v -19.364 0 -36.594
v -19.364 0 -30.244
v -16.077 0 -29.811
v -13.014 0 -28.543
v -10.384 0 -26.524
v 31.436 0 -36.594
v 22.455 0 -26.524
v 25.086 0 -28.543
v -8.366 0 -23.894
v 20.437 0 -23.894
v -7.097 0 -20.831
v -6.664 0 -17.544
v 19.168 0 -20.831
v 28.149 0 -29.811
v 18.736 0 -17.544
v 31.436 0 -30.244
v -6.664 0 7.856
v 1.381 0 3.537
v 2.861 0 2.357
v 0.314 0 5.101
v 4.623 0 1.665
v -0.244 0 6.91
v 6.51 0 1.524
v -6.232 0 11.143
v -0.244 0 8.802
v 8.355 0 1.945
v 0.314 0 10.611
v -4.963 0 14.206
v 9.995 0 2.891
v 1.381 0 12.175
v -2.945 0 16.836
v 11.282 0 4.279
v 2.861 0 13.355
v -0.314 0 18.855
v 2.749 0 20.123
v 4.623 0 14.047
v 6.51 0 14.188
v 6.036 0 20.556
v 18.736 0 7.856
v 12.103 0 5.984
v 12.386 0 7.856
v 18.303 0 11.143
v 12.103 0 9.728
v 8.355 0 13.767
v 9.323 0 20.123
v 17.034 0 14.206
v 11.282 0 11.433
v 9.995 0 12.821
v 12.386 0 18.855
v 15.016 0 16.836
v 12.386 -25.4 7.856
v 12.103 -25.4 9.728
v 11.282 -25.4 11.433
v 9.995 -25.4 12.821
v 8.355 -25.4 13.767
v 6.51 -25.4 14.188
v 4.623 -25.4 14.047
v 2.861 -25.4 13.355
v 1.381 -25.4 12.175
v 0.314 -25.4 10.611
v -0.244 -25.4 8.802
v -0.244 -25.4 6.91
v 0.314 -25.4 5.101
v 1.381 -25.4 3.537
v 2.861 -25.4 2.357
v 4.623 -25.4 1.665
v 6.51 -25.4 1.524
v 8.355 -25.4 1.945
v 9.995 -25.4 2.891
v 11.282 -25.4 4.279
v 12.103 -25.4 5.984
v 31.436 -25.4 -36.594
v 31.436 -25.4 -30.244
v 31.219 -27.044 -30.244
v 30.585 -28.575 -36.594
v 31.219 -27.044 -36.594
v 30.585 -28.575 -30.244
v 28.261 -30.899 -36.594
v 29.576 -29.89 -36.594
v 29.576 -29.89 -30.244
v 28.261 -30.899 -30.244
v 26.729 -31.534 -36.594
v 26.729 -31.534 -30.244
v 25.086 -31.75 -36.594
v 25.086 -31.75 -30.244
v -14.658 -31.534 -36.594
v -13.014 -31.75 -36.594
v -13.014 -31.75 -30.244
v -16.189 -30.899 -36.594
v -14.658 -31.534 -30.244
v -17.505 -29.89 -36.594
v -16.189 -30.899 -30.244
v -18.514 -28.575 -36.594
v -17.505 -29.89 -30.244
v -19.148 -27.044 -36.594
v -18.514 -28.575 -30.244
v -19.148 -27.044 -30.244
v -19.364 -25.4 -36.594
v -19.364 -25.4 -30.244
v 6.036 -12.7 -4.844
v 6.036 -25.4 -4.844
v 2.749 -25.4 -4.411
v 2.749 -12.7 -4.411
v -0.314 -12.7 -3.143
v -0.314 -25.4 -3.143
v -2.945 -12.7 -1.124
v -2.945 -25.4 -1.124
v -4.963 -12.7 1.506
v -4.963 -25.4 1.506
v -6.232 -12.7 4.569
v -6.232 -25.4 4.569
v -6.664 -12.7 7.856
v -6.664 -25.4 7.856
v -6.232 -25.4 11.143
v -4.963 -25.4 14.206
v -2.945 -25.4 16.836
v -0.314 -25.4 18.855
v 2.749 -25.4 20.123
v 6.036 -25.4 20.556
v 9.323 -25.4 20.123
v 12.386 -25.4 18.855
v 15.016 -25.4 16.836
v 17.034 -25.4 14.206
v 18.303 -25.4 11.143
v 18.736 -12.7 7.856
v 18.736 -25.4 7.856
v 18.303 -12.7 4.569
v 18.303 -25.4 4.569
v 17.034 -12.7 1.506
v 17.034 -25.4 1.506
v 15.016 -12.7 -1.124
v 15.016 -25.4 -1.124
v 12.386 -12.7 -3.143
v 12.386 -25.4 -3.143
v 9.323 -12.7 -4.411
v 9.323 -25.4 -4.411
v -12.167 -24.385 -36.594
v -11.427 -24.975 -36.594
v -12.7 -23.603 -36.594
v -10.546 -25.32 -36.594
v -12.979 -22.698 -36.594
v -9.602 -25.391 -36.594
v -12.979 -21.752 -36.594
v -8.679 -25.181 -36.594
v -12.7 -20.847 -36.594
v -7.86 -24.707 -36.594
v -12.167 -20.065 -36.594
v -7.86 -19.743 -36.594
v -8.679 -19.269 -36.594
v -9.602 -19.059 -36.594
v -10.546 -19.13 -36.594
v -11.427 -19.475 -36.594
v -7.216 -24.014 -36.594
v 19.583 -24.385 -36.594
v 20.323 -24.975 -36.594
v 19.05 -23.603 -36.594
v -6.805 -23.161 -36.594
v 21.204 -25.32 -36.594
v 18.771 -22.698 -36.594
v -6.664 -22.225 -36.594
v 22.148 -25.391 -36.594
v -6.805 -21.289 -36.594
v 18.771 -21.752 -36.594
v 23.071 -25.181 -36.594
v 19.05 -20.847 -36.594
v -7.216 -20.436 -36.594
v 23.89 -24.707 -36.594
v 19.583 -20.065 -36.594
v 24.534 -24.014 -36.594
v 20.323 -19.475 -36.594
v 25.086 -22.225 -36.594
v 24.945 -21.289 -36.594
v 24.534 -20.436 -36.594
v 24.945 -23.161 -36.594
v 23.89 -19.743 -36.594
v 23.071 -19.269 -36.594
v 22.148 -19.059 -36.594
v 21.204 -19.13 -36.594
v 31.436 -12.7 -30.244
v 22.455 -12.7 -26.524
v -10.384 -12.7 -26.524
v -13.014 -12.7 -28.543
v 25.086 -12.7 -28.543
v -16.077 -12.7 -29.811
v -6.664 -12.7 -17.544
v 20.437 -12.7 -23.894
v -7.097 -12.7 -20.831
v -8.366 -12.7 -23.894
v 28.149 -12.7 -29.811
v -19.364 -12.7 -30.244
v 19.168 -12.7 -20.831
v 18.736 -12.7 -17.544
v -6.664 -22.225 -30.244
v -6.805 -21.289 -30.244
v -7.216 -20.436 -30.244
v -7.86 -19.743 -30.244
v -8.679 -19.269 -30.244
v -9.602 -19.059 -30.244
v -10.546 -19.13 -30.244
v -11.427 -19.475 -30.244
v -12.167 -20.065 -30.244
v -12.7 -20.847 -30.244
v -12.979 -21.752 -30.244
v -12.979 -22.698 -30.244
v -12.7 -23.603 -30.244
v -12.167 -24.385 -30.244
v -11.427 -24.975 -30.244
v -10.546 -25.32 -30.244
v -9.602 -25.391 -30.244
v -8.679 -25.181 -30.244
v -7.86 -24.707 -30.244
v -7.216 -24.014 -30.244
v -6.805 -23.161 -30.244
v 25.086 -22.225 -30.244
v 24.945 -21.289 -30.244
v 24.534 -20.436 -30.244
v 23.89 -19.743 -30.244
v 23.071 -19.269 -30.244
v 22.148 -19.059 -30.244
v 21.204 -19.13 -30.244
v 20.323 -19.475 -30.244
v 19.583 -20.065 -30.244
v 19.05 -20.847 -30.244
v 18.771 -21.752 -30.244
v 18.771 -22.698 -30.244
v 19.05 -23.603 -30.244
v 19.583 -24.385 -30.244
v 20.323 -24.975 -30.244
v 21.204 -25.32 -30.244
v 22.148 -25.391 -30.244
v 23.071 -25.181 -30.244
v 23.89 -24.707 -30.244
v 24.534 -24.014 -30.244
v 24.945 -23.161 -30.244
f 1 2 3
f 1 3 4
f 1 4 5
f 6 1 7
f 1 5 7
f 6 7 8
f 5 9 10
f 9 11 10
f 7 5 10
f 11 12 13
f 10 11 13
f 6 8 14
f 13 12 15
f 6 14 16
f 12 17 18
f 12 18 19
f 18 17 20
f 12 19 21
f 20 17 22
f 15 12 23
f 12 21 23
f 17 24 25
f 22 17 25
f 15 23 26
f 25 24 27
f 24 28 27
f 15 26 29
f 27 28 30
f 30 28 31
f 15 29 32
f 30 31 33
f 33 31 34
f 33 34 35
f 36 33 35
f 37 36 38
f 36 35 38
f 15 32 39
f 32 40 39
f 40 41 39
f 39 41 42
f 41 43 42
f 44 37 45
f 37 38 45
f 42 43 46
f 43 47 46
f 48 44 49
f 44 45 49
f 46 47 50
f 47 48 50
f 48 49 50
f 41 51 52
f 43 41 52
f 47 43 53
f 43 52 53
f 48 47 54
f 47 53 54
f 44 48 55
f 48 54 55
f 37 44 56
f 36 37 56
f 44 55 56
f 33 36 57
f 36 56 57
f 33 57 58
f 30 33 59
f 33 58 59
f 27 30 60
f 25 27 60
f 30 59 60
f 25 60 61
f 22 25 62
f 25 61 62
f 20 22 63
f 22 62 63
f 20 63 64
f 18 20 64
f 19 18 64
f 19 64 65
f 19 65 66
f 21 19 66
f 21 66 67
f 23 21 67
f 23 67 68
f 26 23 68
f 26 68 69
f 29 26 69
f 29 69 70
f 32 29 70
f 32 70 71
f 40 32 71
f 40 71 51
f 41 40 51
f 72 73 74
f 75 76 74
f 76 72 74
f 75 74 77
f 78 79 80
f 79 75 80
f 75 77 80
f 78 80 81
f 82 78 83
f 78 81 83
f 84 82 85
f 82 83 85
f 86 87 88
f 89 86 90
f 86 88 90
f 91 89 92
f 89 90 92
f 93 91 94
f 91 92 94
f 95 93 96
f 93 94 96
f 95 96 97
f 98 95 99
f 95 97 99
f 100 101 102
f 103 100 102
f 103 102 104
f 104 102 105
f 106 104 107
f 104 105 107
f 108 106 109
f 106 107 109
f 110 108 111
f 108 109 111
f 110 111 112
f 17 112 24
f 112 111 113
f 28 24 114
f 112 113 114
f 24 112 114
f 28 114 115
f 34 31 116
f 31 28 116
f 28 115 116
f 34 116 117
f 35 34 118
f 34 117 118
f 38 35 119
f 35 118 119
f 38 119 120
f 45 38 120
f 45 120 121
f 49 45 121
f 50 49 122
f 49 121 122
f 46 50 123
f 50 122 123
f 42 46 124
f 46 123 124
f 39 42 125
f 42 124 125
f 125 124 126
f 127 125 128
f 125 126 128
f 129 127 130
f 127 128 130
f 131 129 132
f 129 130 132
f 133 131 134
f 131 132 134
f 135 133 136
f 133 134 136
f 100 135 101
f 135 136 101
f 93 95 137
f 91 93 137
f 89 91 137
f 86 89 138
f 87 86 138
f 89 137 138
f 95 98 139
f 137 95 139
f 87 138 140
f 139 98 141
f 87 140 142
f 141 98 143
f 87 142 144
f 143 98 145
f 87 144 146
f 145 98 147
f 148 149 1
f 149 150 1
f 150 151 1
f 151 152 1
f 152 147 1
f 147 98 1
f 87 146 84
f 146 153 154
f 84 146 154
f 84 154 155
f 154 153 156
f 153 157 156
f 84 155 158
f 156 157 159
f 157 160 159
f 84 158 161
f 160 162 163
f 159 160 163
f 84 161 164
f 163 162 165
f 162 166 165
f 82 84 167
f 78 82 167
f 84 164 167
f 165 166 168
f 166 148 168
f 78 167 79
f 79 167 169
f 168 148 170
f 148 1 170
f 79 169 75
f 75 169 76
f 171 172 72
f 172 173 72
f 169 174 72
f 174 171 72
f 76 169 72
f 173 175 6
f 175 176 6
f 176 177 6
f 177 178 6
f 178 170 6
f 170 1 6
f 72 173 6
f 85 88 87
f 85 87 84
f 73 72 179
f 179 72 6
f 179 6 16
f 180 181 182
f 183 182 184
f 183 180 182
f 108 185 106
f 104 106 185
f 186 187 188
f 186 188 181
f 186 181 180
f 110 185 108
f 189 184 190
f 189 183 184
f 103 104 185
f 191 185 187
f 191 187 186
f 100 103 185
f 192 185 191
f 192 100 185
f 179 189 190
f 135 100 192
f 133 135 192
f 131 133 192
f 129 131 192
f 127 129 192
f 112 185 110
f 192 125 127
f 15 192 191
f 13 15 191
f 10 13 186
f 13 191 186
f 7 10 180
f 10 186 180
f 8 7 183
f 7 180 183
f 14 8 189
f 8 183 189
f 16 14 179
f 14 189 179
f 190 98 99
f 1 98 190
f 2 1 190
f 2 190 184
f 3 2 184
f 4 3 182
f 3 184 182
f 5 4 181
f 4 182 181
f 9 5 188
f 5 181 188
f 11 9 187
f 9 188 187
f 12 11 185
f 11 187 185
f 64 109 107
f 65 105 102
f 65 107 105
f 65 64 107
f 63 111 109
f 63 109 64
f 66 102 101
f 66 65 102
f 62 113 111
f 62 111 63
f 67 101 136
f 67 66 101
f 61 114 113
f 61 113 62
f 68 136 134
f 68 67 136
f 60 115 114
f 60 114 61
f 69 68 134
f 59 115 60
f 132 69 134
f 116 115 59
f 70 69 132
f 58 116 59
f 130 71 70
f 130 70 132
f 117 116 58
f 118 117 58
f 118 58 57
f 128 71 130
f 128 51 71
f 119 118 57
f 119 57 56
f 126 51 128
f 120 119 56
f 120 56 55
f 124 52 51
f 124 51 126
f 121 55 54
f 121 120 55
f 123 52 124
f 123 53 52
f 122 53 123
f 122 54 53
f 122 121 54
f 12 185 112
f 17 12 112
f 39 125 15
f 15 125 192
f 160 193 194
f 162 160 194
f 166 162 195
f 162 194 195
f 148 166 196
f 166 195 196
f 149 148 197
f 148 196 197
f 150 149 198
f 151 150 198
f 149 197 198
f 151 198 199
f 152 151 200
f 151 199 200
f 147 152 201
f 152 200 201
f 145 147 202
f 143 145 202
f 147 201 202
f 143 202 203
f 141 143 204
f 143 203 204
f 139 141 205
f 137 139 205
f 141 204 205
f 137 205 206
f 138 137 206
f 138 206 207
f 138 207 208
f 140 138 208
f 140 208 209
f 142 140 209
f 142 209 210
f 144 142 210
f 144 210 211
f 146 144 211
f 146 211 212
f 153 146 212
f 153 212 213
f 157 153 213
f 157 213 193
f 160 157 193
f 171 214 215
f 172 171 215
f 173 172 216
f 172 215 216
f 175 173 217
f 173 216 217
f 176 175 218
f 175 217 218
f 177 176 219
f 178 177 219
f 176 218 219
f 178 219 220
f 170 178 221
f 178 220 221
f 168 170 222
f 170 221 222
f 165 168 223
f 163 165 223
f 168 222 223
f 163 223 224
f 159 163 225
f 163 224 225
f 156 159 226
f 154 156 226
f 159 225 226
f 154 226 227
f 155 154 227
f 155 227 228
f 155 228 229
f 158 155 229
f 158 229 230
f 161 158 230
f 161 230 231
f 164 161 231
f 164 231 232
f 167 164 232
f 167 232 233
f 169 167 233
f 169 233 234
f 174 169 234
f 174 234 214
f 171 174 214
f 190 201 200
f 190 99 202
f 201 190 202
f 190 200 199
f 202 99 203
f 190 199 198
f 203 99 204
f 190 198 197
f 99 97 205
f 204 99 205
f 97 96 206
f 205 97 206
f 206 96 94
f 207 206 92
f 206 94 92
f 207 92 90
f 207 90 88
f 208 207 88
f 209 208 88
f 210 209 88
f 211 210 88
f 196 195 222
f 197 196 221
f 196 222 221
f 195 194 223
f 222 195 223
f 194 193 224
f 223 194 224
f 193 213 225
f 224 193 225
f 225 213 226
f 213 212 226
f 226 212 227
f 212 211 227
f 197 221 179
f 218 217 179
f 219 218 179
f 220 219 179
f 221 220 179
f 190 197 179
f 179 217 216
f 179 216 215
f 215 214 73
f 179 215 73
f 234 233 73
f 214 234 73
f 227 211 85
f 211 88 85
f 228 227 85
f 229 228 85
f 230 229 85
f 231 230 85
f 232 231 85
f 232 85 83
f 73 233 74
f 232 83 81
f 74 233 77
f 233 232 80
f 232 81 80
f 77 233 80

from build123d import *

# Parameters (mm, degrees)
F0_W      = 50.8
F0_H      = 57.15
F1_DEPTH  = 31.75
F2_W      = 50.8
F2_H      = 50.8
F3_DEPTH  = 6.35
F4_DEPTH  = 12.7
F6_DEPTH  = 25.4
F8_DEPTH  = 12.7
F9_DEPTH  = 25.4
F10_R     = 6.35
F11_DEPTH = 50.8
F12_R     = 3.175
F13_DEPTH = 25.4


with BuildPart() as f1:
    # F0 (on Front) → F1 (new body)
    with BuildSketch(Plane.XZ):
        with Locations((6.0355709866, -8.0190159138)):
            Rectangle(F0_W, F0_H)
    extrude(amount=F1_DEPTH)

    # F2 (on face) → F3 (join)
    with BuildSketch(Plane.XZ.offset(31.75)):
        with Locations((6.0355709866, -4.8440159138)):
            Rectangle(F2_W, F2_H)
    extrude(amount=F3_DEPTH)

    # F4 (cut): a face of the model
    f4_faces = [f1.faces().sort_by_distance(p)[0] for p in [
        (6.0355709866, -38.1, -4.8440159138),
    ]]
    extrude(f4_faces, amount=-F4_DEPTH, mode=Mode.SUBTRACT)

    # F5 (on face) → F6 (cut)
    with BuildSketch(Plane.XZ.offset(25.4)):
        with BuildLine():
            Line((-6.6644290134, -17.5440159138), (-6.6644290134, 20.5559840862))
            Line((-6.6644290134, 20.5559840862), (-19.3644290134, 20.5559840862))
            Line((-19.3644290134, 20.5559840862), (-19.3644290134, -30.2440159138))
            ThreePointArc((-19.3644290134, -30.2440159138), (-10.3841728924, -26.5242720349), (-6.6644290134, -17.5440159138))
        make_face()
        with BuildLine():
            Line((31.4355709866, 20.5559840862), (18.7355709866, 20.5559840862))
            Line((18.7355709866, 20.5559840862), (18.7355709866, -17.5440159138))
            ThreePointArc((18.7355709866, -17.5440159138), (22.4553148655, -26.5242720349), (31.4355709866, -30.2440159138))
            Line((31.4355709866, -30.2440159138), (31.4355709866, 20.5559840862))
        make_face()
    extrude(amount=-F6_DEPTH, mode=Mode.SUBTRACT)

    # F7 (on face) → F8 (cut)
    with BuildSketch(Plane.XZ.offset(25.4)):
        with BuildLine():
            ThreePointArc((6.0355709866, -4.8440159138), (-2.9446851345, -1.1242720349), (-6.6644290134, 7.8559840862))
            Line((-6.6644290134, 7.8559840862), (-6.6644290134, -17.5440159138))
            ThreePointArc((-6.6644290134, -17.5440159138), (-10.3841728924, -26.5242720349), (-19.3644290134, -30.2440159138))
            Line((-19.3644290134, -30.2440159138), (31.4355709866, -30.2440159138))
            ThreePointArc((31.4355709866, -30.2440159138), (22.4553148655, -26.5242720349), (18.7355709866, -17.5440159138))
            Line((18.7355709866, -17.5440159138), (18.7355709866, 7.8559840862))
            ThreePointArc((18.7355709866, 7.8559840862), (15.0158271076, -1.1242720349), (6.0355709866, -4.8440159138))
        make_face()
        with BuildLine():
            Line((18.7355709866, 20.5559840862), (6.0355709866, 20.5559840862))
            ThreePointArc((6.0355709866, 20.5559840862), (15.0158271076, 16.8362402072), (18.7355709866, 7.8559840862))
            Line((18.7355709866, 7.8559840862), (18.7355709866, 20.5559840862))
        make_face()
        with BuildLine():
            ThreePointArc((-6.6644290134, 7.8559840862), (-2.9446851345, 16.8362402072), (6.0355709866, 20.5559840862))
            Line((6.0355709866, 20.5559840862), (-6.6644290134, 20.5559840862))
            Line((-6.6644290134, 20.5559840862), (-6.6644290134, 7.8559840862))
        make_face()
    extrude(amount=-F8_DEPTH, mode=Mode.SUBTRACT)

    # F9 (cut): faces of the model
    f9_faces = [f1.faces().sort_by_distance(p)[0] for p in [
        (15.898798162, -12.7, 17.7192112615),
        (-3.8276561888, -12.7, 17.7192112615),
    ]]
    extrude(f9_faces, amount=-F9_DEPTH, mode=Mode.SUBTRACT)

    # F10 (on face) → F11 (cut)
    with BuildSketch(Plane.XZ.offset(25.4)):
        with Locations((6.0355709866, 7.8559840862)):
            Circle(F10_R)
    extrude(amount=-F11_DEPTH, mode=Mode.SUBTRACT)

    # F12 (on face) → F13 (cut)
    with BuildSketch(Plane.XY.offset(-30.2440159138)):
        with Locations((-9.8394290134, -22.225)):
            Circle(F12_R)
        with BuildLine():
            ThreePointArc((-13.0144290134, -31.75), (-17.504557074, -29.8901280605), (-19.3644290134, -25.4))
            Line((-19.3644290134, -25.4), (-19.3644290134, -31.75))
            Line((-19.3644290134, -31.75), (-13.0144290134, -31.75))
        make_face()
        with Locations((21.9105709866, -22.225)):
            Circle(F12_R)
        with BuildLine():
            Line((31.4355709866, -31.75), (31.4355709866, -25.4))
            ThreePointArc((31.4355709866, -25.4), (29.5756990471, -29.8901280605), (25.0855709866, -31.75))
            Line((25.0855709866, -31.75), (31.4355709866, -31.75))
        make_face()
    extrude(amount=-F13_DEPTH, mode=Mode.SUBTRACT)


solid = f1.part
